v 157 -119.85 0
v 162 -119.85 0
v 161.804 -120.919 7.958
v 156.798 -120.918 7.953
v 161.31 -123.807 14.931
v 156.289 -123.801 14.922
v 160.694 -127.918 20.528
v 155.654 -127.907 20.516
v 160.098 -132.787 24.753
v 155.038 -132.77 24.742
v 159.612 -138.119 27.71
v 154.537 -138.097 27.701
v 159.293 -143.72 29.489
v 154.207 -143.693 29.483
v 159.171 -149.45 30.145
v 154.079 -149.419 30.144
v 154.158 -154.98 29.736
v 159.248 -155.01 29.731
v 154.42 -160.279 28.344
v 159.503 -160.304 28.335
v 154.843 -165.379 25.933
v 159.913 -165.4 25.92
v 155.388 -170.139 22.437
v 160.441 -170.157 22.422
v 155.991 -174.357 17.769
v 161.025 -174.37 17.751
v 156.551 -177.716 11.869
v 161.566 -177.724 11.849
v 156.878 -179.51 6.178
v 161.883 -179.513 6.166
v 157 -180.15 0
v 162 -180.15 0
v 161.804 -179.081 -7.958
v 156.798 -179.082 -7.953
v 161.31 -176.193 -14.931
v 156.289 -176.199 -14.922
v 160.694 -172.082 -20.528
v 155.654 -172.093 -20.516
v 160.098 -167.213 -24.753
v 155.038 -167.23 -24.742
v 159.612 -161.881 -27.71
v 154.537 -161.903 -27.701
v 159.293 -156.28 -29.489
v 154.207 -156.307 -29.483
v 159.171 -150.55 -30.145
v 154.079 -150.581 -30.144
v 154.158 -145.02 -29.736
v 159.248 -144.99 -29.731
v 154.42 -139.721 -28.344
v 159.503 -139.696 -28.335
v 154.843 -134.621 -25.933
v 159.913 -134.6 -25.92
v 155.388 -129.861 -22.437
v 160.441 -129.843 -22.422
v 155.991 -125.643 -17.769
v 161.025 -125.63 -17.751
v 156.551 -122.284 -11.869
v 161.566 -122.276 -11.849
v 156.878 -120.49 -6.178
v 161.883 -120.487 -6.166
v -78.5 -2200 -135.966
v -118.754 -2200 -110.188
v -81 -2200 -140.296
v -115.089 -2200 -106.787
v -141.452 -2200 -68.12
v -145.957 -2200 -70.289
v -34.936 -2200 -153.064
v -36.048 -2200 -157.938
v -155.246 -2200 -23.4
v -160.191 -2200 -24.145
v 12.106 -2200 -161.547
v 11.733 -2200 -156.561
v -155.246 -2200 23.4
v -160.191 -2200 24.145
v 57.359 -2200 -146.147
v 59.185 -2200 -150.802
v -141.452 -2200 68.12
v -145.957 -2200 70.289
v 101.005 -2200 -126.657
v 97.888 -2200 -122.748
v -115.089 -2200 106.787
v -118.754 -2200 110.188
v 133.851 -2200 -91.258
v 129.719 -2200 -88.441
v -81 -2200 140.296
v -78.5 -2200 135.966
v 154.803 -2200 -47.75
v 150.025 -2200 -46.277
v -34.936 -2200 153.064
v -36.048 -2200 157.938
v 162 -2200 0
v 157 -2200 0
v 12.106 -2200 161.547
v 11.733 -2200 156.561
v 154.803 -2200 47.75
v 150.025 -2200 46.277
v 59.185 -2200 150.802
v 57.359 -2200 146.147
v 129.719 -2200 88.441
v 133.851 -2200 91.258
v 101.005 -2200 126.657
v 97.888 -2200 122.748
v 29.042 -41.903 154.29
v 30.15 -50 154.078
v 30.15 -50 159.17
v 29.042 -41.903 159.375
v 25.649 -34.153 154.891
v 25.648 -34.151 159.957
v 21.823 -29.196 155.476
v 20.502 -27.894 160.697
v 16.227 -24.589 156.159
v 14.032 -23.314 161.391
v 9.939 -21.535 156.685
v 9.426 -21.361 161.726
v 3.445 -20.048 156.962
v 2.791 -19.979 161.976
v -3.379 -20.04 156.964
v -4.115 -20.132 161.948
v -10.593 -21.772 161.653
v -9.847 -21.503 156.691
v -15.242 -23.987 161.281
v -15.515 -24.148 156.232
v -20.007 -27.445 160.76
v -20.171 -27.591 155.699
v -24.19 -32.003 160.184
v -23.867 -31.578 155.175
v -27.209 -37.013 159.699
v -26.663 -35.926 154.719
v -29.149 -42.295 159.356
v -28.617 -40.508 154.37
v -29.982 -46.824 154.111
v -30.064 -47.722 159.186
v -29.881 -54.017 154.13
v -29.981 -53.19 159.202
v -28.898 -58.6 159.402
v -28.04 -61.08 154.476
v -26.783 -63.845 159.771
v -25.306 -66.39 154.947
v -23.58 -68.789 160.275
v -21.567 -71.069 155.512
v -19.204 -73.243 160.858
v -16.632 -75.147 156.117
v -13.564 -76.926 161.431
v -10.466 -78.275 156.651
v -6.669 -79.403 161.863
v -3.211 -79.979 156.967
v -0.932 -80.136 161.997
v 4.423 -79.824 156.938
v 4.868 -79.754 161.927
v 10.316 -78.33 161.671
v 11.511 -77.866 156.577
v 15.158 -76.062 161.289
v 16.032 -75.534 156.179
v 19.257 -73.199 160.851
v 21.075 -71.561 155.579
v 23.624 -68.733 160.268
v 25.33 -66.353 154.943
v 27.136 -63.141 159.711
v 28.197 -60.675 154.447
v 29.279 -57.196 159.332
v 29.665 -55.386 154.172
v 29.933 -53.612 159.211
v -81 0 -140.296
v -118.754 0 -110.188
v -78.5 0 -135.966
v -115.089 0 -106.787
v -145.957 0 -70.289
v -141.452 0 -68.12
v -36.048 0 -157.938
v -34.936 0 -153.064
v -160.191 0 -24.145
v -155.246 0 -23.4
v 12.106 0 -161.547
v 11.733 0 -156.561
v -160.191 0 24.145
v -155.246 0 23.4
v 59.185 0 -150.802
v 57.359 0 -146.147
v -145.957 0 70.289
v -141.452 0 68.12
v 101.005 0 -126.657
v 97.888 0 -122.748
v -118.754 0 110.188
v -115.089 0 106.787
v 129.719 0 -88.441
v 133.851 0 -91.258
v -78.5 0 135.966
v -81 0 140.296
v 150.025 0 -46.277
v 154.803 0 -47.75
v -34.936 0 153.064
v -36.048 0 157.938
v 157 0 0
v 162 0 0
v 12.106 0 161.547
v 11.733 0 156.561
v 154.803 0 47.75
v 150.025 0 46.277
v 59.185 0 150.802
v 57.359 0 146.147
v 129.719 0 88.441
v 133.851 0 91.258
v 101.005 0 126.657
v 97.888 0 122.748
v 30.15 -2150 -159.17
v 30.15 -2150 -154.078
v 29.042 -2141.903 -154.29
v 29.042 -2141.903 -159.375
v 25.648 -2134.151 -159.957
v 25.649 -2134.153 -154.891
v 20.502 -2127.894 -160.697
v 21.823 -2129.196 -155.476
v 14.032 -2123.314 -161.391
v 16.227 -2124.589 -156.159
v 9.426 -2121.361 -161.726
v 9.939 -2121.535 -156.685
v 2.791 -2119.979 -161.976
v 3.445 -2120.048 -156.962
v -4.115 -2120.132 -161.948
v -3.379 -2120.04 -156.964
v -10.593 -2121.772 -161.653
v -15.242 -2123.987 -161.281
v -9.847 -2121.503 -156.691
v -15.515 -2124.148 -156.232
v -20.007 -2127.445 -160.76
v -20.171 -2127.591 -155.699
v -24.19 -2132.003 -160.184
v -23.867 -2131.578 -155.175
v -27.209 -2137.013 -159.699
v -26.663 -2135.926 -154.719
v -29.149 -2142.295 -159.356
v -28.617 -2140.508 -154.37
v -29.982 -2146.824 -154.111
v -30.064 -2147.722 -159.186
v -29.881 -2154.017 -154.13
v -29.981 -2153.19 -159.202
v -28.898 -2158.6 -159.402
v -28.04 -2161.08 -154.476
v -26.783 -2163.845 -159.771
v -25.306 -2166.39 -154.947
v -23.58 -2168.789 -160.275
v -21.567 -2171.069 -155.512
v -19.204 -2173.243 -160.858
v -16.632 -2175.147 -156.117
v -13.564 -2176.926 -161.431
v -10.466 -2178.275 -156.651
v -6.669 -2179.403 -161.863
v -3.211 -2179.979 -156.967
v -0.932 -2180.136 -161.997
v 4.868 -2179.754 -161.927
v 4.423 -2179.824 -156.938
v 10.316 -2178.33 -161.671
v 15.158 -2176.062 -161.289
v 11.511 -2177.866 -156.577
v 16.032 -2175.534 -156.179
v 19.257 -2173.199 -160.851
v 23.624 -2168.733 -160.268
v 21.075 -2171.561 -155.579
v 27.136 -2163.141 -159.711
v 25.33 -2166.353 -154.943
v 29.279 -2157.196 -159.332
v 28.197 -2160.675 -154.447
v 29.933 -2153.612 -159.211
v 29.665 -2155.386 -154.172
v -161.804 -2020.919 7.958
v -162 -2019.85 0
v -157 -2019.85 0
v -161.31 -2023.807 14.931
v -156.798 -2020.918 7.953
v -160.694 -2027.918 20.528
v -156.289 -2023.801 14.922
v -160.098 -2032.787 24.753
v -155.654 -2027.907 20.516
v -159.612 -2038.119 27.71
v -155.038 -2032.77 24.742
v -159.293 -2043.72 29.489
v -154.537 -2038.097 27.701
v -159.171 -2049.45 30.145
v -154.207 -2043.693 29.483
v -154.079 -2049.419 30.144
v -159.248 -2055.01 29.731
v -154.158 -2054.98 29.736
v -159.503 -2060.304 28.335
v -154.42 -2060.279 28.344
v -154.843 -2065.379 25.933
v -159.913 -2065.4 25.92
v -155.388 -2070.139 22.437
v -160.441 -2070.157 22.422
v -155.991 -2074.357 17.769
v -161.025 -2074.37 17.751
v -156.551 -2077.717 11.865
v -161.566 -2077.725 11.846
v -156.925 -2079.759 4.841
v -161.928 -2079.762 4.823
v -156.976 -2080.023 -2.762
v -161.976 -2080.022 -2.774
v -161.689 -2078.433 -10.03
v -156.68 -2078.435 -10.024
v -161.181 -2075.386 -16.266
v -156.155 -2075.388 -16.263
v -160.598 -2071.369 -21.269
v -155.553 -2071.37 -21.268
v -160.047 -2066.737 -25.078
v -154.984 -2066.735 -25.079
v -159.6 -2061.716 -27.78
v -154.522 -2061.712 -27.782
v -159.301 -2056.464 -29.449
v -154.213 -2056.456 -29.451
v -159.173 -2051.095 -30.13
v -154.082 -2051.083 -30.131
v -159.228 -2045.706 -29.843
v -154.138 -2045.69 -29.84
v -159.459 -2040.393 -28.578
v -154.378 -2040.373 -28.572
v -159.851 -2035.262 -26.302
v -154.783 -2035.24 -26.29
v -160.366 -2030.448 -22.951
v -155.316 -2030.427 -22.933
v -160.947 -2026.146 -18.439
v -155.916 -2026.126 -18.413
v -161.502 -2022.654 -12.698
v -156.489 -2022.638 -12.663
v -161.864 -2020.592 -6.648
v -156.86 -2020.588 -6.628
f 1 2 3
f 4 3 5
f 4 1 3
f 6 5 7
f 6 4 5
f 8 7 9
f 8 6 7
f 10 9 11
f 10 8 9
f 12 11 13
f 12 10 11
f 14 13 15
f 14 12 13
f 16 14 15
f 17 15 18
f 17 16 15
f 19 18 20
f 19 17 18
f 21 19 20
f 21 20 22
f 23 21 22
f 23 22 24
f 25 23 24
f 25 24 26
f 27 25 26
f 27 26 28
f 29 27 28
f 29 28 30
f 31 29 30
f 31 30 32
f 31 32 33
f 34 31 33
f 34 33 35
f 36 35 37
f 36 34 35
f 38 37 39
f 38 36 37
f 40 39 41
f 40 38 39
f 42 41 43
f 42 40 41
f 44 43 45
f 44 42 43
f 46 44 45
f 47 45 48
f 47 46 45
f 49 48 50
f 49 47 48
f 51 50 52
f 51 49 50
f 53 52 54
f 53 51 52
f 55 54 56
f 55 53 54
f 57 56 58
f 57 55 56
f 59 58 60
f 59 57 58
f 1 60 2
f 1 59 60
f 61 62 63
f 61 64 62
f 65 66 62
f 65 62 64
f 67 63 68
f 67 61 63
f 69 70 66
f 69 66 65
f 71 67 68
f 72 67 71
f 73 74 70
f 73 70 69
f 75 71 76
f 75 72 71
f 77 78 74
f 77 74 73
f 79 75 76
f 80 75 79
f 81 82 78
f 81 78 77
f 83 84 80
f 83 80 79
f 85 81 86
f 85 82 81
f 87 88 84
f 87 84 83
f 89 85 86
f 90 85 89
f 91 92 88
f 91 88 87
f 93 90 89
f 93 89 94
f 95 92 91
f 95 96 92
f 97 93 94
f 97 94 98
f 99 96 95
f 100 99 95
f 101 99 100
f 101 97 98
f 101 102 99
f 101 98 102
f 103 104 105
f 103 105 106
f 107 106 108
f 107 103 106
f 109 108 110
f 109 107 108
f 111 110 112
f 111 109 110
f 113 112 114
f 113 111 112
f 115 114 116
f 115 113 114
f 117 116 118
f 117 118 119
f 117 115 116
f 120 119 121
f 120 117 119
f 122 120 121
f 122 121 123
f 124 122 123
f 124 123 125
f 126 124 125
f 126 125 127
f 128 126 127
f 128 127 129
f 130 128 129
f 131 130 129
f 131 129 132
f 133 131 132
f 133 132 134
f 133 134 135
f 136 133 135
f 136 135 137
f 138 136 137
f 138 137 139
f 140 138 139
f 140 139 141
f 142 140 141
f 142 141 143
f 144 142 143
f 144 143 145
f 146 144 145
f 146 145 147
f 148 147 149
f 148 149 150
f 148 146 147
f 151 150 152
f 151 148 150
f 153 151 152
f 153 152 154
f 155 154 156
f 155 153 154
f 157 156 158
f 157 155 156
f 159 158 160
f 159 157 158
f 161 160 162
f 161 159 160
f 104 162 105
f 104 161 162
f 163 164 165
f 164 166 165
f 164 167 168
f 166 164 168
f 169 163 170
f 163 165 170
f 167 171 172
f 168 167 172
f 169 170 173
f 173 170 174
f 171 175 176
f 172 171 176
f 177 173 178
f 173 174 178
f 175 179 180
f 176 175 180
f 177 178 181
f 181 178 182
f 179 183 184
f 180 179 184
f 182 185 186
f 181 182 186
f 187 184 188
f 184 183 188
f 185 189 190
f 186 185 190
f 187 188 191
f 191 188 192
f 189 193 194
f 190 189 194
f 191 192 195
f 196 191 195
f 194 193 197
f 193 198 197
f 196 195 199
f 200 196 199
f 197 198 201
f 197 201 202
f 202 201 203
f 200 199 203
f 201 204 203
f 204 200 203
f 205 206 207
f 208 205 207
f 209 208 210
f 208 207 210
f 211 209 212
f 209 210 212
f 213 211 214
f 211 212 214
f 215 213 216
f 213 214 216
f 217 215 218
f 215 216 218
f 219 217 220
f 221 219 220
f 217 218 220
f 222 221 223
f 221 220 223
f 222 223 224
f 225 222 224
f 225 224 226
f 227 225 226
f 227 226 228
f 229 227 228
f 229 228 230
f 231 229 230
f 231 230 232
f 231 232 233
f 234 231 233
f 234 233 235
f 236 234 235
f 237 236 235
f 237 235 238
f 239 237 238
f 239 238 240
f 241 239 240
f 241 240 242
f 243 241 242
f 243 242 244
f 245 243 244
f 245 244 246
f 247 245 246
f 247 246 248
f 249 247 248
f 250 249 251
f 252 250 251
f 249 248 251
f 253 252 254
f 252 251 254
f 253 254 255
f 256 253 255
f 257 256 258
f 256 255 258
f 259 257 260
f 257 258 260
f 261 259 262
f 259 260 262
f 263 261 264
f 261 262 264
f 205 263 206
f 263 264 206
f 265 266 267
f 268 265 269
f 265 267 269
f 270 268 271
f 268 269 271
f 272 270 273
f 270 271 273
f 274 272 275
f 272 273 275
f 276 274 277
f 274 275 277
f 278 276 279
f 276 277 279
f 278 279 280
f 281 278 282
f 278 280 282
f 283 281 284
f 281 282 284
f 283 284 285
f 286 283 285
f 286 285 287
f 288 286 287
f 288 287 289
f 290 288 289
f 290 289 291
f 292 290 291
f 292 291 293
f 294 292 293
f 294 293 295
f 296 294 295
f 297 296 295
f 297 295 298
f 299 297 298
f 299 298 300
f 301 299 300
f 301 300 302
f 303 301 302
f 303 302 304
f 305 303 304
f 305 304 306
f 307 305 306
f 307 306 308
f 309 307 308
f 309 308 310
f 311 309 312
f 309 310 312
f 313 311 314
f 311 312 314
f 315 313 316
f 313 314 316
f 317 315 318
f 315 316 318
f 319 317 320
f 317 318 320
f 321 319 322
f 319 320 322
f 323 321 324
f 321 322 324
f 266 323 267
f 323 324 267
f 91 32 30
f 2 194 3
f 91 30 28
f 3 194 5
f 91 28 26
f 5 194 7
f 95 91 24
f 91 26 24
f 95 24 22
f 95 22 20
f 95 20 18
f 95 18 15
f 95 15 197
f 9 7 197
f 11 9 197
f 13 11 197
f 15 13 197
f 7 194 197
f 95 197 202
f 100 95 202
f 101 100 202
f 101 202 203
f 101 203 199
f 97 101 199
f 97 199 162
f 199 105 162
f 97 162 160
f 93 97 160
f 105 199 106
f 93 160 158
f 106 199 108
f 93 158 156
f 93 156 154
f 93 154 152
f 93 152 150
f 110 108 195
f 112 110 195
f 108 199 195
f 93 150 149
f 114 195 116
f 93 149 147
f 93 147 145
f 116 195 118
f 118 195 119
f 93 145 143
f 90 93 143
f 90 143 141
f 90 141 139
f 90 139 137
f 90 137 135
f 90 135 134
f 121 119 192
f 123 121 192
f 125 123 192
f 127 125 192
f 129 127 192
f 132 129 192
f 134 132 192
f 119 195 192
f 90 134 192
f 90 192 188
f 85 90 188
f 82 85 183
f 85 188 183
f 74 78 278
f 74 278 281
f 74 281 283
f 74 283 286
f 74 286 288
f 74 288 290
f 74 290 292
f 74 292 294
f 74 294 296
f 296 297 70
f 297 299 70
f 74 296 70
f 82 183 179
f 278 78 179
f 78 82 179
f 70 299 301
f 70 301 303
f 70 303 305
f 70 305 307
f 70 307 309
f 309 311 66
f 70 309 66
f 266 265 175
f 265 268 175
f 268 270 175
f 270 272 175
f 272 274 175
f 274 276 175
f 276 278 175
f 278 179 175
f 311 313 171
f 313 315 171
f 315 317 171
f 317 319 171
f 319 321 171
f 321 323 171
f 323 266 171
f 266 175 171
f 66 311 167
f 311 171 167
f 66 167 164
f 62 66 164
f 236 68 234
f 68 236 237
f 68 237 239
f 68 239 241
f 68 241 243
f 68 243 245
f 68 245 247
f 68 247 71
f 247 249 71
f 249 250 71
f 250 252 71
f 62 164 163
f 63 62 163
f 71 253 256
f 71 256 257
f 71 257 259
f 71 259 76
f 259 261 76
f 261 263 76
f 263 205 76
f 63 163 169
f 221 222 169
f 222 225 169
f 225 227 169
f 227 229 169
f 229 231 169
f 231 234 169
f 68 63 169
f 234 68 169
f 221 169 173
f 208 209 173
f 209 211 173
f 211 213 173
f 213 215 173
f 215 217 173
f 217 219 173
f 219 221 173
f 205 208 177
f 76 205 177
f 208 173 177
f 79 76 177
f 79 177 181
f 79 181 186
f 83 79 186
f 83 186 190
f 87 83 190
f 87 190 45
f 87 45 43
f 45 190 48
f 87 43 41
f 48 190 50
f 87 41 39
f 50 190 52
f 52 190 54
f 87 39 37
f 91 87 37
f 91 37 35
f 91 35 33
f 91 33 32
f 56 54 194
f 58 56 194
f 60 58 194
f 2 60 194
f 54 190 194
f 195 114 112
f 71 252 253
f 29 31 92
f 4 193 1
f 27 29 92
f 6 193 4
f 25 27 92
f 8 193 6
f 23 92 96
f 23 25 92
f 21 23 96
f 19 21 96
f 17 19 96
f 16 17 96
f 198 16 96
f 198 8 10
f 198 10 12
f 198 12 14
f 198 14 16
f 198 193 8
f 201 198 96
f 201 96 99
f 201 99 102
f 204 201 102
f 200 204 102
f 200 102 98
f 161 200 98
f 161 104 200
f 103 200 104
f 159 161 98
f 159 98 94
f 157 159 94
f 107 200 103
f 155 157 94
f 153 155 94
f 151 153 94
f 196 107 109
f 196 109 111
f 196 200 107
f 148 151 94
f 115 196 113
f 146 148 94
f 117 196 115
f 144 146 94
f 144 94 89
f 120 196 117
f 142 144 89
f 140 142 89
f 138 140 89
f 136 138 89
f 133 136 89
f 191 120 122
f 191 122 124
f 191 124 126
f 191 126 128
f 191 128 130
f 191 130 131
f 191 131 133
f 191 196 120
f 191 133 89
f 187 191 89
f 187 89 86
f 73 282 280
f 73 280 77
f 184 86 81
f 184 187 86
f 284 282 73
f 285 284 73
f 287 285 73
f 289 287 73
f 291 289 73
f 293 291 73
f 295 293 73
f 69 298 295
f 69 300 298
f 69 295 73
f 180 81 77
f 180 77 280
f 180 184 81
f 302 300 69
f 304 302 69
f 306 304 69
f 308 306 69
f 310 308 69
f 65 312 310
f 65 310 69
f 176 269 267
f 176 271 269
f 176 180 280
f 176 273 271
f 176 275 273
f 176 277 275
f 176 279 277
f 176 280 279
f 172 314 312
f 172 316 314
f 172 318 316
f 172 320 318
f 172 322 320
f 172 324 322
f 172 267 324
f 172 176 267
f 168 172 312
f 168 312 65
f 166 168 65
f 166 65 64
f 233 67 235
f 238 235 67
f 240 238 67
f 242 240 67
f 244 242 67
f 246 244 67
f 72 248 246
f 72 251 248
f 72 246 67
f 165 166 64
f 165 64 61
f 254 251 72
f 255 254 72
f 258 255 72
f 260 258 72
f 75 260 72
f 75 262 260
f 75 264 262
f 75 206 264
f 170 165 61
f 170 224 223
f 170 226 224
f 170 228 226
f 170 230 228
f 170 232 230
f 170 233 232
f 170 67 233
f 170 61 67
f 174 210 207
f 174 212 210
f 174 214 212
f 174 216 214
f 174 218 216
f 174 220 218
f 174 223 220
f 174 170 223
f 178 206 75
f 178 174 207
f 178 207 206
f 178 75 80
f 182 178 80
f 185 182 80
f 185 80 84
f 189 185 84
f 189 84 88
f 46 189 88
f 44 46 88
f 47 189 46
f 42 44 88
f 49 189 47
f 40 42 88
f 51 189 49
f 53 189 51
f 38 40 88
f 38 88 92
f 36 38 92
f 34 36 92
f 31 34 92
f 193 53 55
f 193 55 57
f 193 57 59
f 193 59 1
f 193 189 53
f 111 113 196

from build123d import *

# Parameters (mm, degrees)
F0_R     = 162
F0_R_2   = 157.0000052452
F1_DEPTH = 2200
F2_R     = 30.15
F3_DEPTH = 163.000000104
F4_R     = 30.15
F5_DEPTH = 163.0000001
F6_DEPTH = 163.0000001
F7_DEPTH = 163.000000104


with BuildPart() as f1:
    # F0 (on Front) → F1 (new body)
    with BuildSketch(Plane.XZ):
        Circle(F0_R)
        Circle(F0_R_2, mode=Mode.SUBTRACT)
    extrude(amount=F1_DEPTH)

    # F2 (on Top) → F3 (cut, up to face)
    with BuildSketch(Plane.XY):
        with Locations((0, -50)):
            Circle(F2_R)
    extrude(amount=F3_DEPTH, mode=Mode.SUBTRACT)

    # F4 (on Right) → F5 (cut, up to face)
    with BuildSketch(Plane.YZ):
        with Locations((-150, 0)):
            Circle(F4_R)
    extrude(amount=F5_DEPTH, mode=Mode.SUBTRACT)

    # F4 (on Right) → F6 (cut, up to face)
    with BuildSketch(Plane.YZ):
        with Locations((-2050, 0)):
            Circle(F4_R)
    extrude(amount=-F6_DEPTH, mode=Mode.SUBTRACT)

    # F2 (on Top) → F7 (cut, up to face)
    with BuildSketch(Plane.XY):
        with Locations((0, -2150)):
            Circle(F2_R)
    extrude(amount=-F7_DEPTH, mode=Mode.SUBTRACT)


solid = f1.part
